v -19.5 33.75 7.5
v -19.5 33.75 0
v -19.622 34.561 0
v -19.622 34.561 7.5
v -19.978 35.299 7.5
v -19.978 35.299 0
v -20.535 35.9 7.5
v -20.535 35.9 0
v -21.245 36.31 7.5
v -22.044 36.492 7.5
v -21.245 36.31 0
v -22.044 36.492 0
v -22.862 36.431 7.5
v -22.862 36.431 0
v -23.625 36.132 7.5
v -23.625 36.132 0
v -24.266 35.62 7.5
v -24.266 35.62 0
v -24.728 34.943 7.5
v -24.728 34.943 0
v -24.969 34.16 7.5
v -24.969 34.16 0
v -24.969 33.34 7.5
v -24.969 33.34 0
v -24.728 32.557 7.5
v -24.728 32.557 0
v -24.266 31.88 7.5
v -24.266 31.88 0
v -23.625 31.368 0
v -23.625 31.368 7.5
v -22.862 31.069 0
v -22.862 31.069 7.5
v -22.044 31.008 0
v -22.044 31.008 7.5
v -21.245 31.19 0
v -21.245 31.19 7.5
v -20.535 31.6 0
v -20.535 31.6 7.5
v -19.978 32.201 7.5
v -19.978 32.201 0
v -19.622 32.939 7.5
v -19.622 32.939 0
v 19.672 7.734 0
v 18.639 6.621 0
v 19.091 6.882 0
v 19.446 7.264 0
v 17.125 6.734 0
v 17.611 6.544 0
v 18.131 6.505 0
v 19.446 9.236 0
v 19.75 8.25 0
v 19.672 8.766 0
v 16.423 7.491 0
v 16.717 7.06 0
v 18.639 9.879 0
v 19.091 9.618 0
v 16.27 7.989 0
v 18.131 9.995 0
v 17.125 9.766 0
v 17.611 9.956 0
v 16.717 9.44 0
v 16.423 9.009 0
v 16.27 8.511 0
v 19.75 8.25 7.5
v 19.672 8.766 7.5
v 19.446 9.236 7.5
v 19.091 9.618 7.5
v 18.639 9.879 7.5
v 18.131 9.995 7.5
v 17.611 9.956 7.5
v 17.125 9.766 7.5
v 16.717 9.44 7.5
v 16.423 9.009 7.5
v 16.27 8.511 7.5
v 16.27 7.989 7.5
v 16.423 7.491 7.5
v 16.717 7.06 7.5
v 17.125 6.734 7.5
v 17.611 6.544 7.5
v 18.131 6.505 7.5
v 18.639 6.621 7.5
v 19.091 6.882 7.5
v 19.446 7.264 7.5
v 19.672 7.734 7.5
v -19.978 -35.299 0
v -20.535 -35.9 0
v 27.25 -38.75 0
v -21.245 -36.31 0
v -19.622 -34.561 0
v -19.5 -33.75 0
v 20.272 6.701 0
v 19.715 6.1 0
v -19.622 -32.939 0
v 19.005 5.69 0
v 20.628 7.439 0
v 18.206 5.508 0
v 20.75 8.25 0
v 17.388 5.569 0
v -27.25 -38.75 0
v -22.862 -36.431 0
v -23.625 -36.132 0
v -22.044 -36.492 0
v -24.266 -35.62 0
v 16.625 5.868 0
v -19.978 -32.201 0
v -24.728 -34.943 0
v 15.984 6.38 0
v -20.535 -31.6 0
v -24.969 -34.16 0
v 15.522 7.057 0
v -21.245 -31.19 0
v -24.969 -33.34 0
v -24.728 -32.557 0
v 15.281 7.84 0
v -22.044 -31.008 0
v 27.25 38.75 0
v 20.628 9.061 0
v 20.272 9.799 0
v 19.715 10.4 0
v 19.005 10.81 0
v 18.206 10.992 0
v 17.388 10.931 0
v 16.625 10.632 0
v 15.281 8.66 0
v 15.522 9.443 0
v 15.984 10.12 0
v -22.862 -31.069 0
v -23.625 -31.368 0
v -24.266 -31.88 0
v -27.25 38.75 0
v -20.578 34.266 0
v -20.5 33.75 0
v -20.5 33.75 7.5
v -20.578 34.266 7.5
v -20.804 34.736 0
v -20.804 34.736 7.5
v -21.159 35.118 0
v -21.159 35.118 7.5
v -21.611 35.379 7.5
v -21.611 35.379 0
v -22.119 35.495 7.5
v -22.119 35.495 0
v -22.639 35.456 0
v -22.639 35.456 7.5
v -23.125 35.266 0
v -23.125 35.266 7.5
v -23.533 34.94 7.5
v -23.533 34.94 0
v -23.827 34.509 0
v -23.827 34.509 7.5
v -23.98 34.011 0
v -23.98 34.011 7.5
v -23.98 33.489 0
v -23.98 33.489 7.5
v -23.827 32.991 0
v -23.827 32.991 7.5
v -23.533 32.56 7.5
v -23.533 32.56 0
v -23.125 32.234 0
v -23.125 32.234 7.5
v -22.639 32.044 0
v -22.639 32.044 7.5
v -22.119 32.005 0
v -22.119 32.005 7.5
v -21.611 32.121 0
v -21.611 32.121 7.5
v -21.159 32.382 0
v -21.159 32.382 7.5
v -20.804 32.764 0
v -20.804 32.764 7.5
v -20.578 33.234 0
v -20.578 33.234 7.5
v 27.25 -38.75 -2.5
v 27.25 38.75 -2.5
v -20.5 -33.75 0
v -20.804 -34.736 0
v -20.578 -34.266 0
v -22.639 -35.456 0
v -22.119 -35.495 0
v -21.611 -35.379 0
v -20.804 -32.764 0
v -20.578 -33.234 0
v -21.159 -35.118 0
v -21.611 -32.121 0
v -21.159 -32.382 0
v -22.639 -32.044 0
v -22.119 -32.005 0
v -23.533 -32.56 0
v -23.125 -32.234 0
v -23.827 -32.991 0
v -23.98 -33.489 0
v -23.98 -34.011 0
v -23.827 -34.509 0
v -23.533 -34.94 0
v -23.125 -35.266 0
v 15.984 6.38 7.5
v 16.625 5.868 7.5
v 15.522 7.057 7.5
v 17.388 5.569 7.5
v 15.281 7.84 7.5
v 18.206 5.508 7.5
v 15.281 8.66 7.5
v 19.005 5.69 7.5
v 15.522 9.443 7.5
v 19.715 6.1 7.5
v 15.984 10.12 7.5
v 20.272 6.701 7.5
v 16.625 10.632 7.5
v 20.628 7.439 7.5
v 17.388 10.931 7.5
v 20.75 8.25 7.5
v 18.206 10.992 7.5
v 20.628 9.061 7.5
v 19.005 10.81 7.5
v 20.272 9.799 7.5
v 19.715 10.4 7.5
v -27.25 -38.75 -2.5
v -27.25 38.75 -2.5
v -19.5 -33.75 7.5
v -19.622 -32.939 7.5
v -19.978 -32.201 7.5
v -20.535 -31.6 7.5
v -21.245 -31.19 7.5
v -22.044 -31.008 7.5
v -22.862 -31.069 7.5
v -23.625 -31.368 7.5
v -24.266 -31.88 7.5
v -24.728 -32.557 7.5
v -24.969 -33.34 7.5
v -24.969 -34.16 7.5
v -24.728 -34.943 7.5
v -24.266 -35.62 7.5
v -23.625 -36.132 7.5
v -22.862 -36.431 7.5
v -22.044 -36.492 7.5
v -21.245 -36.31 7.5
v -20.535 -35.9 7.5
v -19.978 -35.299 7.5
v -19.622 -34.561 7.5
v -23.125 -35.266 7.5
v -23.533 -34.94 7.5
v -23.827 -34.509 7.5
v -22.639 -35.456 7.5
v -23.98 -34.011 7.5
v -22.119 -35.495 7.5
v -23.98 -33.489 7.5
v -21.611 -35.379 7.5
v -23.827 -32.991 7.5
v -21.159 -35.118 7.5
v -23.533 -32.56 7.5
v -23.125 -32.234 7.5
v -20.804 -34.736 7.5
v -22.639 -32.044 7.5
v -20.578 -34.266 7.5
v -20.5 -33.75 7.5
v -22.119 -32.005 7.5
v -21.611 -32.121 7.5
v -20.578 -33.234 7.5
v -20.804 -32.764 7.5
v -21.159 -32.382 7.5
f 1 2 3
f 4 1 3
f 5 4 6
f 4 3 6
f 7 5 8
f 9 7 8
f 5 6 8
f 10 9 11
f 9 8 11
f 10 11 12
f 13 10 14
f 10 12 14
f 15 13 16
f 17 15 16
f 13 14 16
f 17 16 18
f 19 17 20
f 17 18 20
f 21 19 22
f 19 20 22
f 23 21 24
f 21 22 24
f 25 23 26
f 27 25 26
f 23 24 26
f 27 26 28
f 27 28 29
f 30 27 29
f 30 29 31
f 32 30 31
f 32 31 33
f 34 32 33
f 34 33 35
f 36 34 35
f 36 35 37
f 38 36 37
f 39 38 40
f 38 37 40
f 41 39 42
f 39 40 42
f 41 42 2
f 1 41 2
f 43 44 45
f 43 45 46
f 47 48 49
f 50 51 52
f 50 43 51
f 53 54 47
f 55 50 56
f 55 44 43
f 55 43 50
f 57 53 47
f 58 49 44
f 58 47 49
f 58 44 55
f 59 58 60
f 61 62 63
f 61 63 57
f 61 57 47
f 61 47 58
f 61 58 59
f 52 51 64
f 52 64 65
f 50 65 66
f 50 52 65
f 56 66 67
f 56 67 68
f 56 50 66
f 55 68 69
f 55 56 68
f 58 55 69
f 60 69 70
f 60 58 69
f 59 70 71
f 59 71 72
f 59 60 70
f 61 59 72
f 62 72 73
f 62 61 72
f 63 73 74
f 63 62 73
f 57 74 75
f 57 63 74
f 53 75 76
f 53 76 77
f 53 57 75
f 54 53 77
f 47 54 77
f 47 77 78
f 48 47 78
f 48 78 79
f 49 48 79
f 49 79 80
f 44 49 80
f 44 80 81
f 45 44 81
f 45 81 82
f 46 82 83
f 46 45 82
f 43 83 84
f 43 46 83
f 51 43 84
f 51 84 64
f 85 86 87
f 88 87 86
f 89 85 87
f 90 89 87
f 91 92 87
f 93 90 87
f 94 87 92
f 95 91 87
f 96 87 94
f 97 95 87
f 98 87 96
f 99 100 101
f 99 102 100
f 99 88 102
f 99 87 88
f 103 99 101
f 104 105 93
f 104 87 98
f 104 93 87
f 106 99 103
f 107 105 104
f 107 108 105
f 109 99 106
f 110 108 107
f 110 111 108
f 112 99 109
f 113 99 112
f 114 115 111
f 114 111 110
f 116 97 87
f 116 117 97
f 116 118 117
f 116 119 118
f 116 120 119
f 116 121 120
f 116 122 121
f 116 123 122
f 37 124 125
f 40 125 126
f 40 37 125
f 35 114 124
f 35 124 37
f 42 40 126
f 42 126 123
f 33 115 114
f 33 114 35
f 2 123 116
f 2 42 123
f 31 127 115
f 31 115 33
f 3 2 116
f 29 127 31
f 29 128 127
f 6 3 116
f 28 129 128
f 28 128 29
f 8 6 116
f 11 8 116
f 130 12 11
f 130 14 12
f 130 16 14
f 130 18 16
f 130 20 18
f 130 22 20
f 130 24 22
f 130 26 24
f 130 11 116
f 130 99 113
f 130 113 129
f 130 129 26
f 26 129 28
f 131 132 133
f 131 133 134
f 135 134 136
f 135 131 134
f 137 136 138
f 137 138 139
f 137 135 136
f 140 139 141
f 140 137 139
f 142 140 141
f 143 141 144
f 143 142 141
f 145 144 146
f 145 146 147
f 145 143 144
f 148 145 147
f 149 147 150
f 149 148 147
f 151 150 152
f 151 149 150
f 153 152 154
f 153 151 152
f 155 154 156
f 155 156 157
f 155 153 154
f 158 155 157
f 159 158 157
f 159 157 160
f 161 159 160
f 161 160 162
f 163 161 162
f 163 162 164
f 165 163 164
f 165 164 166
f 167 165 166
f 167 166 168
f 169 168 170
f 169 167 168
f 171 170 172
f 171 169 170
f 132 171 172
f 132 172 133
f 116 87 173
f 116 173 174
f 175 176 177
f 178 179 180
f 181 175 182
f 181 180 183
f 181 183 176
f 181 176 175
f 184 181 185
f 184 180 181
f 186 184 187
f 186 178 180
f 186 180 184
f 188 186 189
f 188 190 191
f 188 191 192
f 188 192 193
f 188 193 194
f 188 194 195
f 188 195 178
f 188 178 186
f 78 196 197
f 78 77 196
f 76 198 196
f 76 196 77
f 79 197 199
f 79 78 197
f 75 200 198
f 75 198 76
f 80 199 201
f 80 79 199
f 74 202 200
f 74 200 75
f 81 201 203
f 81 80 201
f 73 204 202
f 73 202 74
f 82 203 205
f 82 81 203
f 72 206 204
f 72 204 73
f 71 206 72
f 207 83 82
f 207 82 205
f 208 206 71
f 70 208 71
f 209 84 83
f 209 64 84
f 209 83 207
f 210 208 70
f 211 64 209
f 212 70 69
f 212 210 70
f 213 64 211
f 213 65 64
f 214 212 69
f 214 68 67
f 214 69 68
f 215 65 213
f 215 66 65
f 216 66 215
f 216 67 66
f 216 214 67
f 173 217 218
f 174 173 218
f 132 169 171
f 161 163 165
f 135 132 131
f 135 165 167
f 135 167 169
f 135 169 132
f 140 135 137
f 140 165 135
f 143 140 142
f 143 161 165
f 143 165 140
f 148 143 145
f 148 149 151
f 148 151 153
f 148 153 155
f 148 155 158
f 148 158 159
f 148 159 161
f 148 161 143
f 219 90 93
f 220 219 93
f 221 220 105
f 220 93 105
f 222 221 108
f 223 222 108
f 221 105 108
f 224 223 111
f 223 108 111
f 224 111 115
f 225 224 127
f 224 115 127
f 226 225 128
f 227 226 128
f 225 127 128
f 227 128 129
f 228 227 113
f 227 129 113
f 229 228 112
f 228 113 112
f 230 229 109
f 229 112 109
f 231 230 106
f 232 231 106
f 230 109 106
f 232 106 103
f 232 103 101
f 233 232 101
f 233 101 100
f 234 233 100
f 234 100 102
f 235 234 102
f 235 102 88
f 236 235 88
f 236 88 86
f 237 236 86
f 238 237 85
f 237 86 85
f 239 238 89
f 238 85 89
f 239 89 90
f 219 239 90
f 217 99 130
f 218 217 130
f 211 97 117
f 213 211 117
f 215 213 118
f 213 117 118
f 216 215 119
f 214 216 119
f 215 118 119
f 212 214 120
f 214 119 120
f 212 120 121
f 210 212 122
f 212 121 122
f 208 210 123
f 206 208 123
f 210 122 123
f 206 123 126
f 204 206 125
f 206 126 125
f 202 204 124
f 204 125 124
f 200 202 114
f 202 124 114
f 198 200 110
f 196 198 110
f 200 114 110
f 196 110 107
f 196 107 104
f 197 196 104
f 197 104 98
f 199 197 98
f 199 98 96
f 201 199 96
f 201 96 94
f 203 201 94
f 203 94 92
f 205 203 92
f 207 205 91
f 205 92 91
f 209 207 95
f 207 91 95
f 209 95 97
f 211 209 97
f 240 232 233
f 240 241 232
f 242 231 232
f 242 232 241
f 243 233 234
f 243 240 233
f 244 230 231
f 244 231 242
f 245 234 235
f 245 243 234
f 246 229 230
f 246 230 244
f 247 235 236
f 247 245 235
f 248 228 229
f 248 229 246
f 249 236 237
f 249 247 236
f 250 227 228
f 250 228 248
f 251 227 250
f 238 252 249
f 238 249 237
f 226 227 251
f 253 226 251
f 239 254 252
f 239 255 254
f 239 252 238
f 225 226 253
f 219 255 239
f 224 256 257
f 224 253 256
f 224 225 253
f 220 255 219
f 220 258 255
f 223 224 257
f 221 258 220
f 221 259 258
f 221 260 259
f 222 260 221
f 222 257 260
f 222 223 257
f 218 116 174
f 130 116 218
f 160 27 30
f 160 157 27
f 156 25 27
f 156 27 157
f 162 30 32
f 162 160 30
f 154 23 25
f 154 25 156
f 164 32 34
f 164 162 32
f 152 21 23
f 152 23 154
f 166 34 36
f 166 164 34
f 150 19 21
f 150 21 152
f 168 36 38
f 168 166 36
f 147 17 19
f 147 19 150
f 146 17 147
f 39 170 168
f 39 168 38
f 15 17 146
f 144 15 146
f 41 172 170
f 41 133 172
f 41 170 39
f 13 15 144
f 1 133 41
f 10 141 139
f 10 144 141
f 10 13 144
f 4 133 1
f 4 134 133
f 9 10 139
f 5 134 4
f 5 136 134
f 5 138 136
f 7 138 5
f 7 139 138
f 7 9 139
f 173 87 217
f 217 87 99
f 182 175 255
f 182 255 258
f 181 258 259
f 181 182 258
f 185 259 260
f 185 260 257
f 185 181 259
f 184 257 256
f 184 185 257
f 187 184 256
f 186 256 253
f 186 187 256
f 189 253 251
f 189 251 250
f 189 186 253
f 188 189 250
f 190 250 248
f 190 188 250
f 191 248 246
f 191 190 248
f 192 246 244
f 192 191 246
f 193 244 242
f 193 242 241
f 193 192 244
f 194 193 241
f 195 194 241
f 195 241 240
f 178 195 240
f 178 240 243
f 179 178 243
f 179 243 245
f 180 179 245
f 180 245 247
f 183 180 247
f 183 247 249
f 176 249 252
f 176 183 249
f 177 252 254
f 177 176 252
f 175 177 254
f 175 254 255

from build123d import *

# Parameters (mm, degrees)
SKETCH1_W           = 77.5
SKETCH1_H           = 54.5
BOSS_EXTRUDE1_DEPTH = 2.5
SKETCH1_5_R         = 2.75
SKETCH1_5_R_2       = 1.75
BOSS_EXTRUDE2_DEPTH = 7.5


with BuildPart() as part:
    # Sketch1 → Boss-Extrude1 (new body)
    with BuildSketch(Plane(origin=(0, 0, 0), x_dir=(0, 1, 0), z_dir=(0, 0, 1))):
        Rectangle(SKETCH1_W, SKETCH1_H)
    extrude(amount=-BOSS_EXTRUDE1_DEPTH)

    # Sketch1<5> → Boss-Extrude2 (add)
    # profile 1 of 3: a face of its own
    with BuildSketch(Plane(origin=(0, 0, 0), x_dir=(0, 1, 0), z_dir=(0, 0, 1))):
        with Locations((-33.75, 22.25)):
            Circle(SKETCH1_5_R)
        with Locations((-33.75, 22.25)):
            Circle(SKETCH1_5_R_2, mode=Mode.SUBTRACT)
    # profile 2 of 3: a face of its own
    with BuildSketch(Plane(origin=(0, 0, 0), x_dir=(0, 1, 0), z_dir=(0, 0, 1))):
        with Locations((33.75, 22.25)):
            Circle(SKETCH1_5_R)
        with Locations((33.75, 22.25)):
            Circle(SKETCH1_5_R_2, mode=Mode.SUBTRACT)
    # profile 3 of 3: a face of its own
    with BuildSketch(Plane(origin=(0, 0, 0), x_dir=(0, 1, 0), z_dir=(0, 0, 1))):
        with Locations((8.25, -18)):
            Circle(SKETCH1_5_R)
        with Locations((8.25, -18)):
            Circle(SKETCH1_5_R_2, mode=Mode.SUBTRACT)
    extrude(amount=BOSS_EXTRUDE2_DEPTH)


solid = part.part
